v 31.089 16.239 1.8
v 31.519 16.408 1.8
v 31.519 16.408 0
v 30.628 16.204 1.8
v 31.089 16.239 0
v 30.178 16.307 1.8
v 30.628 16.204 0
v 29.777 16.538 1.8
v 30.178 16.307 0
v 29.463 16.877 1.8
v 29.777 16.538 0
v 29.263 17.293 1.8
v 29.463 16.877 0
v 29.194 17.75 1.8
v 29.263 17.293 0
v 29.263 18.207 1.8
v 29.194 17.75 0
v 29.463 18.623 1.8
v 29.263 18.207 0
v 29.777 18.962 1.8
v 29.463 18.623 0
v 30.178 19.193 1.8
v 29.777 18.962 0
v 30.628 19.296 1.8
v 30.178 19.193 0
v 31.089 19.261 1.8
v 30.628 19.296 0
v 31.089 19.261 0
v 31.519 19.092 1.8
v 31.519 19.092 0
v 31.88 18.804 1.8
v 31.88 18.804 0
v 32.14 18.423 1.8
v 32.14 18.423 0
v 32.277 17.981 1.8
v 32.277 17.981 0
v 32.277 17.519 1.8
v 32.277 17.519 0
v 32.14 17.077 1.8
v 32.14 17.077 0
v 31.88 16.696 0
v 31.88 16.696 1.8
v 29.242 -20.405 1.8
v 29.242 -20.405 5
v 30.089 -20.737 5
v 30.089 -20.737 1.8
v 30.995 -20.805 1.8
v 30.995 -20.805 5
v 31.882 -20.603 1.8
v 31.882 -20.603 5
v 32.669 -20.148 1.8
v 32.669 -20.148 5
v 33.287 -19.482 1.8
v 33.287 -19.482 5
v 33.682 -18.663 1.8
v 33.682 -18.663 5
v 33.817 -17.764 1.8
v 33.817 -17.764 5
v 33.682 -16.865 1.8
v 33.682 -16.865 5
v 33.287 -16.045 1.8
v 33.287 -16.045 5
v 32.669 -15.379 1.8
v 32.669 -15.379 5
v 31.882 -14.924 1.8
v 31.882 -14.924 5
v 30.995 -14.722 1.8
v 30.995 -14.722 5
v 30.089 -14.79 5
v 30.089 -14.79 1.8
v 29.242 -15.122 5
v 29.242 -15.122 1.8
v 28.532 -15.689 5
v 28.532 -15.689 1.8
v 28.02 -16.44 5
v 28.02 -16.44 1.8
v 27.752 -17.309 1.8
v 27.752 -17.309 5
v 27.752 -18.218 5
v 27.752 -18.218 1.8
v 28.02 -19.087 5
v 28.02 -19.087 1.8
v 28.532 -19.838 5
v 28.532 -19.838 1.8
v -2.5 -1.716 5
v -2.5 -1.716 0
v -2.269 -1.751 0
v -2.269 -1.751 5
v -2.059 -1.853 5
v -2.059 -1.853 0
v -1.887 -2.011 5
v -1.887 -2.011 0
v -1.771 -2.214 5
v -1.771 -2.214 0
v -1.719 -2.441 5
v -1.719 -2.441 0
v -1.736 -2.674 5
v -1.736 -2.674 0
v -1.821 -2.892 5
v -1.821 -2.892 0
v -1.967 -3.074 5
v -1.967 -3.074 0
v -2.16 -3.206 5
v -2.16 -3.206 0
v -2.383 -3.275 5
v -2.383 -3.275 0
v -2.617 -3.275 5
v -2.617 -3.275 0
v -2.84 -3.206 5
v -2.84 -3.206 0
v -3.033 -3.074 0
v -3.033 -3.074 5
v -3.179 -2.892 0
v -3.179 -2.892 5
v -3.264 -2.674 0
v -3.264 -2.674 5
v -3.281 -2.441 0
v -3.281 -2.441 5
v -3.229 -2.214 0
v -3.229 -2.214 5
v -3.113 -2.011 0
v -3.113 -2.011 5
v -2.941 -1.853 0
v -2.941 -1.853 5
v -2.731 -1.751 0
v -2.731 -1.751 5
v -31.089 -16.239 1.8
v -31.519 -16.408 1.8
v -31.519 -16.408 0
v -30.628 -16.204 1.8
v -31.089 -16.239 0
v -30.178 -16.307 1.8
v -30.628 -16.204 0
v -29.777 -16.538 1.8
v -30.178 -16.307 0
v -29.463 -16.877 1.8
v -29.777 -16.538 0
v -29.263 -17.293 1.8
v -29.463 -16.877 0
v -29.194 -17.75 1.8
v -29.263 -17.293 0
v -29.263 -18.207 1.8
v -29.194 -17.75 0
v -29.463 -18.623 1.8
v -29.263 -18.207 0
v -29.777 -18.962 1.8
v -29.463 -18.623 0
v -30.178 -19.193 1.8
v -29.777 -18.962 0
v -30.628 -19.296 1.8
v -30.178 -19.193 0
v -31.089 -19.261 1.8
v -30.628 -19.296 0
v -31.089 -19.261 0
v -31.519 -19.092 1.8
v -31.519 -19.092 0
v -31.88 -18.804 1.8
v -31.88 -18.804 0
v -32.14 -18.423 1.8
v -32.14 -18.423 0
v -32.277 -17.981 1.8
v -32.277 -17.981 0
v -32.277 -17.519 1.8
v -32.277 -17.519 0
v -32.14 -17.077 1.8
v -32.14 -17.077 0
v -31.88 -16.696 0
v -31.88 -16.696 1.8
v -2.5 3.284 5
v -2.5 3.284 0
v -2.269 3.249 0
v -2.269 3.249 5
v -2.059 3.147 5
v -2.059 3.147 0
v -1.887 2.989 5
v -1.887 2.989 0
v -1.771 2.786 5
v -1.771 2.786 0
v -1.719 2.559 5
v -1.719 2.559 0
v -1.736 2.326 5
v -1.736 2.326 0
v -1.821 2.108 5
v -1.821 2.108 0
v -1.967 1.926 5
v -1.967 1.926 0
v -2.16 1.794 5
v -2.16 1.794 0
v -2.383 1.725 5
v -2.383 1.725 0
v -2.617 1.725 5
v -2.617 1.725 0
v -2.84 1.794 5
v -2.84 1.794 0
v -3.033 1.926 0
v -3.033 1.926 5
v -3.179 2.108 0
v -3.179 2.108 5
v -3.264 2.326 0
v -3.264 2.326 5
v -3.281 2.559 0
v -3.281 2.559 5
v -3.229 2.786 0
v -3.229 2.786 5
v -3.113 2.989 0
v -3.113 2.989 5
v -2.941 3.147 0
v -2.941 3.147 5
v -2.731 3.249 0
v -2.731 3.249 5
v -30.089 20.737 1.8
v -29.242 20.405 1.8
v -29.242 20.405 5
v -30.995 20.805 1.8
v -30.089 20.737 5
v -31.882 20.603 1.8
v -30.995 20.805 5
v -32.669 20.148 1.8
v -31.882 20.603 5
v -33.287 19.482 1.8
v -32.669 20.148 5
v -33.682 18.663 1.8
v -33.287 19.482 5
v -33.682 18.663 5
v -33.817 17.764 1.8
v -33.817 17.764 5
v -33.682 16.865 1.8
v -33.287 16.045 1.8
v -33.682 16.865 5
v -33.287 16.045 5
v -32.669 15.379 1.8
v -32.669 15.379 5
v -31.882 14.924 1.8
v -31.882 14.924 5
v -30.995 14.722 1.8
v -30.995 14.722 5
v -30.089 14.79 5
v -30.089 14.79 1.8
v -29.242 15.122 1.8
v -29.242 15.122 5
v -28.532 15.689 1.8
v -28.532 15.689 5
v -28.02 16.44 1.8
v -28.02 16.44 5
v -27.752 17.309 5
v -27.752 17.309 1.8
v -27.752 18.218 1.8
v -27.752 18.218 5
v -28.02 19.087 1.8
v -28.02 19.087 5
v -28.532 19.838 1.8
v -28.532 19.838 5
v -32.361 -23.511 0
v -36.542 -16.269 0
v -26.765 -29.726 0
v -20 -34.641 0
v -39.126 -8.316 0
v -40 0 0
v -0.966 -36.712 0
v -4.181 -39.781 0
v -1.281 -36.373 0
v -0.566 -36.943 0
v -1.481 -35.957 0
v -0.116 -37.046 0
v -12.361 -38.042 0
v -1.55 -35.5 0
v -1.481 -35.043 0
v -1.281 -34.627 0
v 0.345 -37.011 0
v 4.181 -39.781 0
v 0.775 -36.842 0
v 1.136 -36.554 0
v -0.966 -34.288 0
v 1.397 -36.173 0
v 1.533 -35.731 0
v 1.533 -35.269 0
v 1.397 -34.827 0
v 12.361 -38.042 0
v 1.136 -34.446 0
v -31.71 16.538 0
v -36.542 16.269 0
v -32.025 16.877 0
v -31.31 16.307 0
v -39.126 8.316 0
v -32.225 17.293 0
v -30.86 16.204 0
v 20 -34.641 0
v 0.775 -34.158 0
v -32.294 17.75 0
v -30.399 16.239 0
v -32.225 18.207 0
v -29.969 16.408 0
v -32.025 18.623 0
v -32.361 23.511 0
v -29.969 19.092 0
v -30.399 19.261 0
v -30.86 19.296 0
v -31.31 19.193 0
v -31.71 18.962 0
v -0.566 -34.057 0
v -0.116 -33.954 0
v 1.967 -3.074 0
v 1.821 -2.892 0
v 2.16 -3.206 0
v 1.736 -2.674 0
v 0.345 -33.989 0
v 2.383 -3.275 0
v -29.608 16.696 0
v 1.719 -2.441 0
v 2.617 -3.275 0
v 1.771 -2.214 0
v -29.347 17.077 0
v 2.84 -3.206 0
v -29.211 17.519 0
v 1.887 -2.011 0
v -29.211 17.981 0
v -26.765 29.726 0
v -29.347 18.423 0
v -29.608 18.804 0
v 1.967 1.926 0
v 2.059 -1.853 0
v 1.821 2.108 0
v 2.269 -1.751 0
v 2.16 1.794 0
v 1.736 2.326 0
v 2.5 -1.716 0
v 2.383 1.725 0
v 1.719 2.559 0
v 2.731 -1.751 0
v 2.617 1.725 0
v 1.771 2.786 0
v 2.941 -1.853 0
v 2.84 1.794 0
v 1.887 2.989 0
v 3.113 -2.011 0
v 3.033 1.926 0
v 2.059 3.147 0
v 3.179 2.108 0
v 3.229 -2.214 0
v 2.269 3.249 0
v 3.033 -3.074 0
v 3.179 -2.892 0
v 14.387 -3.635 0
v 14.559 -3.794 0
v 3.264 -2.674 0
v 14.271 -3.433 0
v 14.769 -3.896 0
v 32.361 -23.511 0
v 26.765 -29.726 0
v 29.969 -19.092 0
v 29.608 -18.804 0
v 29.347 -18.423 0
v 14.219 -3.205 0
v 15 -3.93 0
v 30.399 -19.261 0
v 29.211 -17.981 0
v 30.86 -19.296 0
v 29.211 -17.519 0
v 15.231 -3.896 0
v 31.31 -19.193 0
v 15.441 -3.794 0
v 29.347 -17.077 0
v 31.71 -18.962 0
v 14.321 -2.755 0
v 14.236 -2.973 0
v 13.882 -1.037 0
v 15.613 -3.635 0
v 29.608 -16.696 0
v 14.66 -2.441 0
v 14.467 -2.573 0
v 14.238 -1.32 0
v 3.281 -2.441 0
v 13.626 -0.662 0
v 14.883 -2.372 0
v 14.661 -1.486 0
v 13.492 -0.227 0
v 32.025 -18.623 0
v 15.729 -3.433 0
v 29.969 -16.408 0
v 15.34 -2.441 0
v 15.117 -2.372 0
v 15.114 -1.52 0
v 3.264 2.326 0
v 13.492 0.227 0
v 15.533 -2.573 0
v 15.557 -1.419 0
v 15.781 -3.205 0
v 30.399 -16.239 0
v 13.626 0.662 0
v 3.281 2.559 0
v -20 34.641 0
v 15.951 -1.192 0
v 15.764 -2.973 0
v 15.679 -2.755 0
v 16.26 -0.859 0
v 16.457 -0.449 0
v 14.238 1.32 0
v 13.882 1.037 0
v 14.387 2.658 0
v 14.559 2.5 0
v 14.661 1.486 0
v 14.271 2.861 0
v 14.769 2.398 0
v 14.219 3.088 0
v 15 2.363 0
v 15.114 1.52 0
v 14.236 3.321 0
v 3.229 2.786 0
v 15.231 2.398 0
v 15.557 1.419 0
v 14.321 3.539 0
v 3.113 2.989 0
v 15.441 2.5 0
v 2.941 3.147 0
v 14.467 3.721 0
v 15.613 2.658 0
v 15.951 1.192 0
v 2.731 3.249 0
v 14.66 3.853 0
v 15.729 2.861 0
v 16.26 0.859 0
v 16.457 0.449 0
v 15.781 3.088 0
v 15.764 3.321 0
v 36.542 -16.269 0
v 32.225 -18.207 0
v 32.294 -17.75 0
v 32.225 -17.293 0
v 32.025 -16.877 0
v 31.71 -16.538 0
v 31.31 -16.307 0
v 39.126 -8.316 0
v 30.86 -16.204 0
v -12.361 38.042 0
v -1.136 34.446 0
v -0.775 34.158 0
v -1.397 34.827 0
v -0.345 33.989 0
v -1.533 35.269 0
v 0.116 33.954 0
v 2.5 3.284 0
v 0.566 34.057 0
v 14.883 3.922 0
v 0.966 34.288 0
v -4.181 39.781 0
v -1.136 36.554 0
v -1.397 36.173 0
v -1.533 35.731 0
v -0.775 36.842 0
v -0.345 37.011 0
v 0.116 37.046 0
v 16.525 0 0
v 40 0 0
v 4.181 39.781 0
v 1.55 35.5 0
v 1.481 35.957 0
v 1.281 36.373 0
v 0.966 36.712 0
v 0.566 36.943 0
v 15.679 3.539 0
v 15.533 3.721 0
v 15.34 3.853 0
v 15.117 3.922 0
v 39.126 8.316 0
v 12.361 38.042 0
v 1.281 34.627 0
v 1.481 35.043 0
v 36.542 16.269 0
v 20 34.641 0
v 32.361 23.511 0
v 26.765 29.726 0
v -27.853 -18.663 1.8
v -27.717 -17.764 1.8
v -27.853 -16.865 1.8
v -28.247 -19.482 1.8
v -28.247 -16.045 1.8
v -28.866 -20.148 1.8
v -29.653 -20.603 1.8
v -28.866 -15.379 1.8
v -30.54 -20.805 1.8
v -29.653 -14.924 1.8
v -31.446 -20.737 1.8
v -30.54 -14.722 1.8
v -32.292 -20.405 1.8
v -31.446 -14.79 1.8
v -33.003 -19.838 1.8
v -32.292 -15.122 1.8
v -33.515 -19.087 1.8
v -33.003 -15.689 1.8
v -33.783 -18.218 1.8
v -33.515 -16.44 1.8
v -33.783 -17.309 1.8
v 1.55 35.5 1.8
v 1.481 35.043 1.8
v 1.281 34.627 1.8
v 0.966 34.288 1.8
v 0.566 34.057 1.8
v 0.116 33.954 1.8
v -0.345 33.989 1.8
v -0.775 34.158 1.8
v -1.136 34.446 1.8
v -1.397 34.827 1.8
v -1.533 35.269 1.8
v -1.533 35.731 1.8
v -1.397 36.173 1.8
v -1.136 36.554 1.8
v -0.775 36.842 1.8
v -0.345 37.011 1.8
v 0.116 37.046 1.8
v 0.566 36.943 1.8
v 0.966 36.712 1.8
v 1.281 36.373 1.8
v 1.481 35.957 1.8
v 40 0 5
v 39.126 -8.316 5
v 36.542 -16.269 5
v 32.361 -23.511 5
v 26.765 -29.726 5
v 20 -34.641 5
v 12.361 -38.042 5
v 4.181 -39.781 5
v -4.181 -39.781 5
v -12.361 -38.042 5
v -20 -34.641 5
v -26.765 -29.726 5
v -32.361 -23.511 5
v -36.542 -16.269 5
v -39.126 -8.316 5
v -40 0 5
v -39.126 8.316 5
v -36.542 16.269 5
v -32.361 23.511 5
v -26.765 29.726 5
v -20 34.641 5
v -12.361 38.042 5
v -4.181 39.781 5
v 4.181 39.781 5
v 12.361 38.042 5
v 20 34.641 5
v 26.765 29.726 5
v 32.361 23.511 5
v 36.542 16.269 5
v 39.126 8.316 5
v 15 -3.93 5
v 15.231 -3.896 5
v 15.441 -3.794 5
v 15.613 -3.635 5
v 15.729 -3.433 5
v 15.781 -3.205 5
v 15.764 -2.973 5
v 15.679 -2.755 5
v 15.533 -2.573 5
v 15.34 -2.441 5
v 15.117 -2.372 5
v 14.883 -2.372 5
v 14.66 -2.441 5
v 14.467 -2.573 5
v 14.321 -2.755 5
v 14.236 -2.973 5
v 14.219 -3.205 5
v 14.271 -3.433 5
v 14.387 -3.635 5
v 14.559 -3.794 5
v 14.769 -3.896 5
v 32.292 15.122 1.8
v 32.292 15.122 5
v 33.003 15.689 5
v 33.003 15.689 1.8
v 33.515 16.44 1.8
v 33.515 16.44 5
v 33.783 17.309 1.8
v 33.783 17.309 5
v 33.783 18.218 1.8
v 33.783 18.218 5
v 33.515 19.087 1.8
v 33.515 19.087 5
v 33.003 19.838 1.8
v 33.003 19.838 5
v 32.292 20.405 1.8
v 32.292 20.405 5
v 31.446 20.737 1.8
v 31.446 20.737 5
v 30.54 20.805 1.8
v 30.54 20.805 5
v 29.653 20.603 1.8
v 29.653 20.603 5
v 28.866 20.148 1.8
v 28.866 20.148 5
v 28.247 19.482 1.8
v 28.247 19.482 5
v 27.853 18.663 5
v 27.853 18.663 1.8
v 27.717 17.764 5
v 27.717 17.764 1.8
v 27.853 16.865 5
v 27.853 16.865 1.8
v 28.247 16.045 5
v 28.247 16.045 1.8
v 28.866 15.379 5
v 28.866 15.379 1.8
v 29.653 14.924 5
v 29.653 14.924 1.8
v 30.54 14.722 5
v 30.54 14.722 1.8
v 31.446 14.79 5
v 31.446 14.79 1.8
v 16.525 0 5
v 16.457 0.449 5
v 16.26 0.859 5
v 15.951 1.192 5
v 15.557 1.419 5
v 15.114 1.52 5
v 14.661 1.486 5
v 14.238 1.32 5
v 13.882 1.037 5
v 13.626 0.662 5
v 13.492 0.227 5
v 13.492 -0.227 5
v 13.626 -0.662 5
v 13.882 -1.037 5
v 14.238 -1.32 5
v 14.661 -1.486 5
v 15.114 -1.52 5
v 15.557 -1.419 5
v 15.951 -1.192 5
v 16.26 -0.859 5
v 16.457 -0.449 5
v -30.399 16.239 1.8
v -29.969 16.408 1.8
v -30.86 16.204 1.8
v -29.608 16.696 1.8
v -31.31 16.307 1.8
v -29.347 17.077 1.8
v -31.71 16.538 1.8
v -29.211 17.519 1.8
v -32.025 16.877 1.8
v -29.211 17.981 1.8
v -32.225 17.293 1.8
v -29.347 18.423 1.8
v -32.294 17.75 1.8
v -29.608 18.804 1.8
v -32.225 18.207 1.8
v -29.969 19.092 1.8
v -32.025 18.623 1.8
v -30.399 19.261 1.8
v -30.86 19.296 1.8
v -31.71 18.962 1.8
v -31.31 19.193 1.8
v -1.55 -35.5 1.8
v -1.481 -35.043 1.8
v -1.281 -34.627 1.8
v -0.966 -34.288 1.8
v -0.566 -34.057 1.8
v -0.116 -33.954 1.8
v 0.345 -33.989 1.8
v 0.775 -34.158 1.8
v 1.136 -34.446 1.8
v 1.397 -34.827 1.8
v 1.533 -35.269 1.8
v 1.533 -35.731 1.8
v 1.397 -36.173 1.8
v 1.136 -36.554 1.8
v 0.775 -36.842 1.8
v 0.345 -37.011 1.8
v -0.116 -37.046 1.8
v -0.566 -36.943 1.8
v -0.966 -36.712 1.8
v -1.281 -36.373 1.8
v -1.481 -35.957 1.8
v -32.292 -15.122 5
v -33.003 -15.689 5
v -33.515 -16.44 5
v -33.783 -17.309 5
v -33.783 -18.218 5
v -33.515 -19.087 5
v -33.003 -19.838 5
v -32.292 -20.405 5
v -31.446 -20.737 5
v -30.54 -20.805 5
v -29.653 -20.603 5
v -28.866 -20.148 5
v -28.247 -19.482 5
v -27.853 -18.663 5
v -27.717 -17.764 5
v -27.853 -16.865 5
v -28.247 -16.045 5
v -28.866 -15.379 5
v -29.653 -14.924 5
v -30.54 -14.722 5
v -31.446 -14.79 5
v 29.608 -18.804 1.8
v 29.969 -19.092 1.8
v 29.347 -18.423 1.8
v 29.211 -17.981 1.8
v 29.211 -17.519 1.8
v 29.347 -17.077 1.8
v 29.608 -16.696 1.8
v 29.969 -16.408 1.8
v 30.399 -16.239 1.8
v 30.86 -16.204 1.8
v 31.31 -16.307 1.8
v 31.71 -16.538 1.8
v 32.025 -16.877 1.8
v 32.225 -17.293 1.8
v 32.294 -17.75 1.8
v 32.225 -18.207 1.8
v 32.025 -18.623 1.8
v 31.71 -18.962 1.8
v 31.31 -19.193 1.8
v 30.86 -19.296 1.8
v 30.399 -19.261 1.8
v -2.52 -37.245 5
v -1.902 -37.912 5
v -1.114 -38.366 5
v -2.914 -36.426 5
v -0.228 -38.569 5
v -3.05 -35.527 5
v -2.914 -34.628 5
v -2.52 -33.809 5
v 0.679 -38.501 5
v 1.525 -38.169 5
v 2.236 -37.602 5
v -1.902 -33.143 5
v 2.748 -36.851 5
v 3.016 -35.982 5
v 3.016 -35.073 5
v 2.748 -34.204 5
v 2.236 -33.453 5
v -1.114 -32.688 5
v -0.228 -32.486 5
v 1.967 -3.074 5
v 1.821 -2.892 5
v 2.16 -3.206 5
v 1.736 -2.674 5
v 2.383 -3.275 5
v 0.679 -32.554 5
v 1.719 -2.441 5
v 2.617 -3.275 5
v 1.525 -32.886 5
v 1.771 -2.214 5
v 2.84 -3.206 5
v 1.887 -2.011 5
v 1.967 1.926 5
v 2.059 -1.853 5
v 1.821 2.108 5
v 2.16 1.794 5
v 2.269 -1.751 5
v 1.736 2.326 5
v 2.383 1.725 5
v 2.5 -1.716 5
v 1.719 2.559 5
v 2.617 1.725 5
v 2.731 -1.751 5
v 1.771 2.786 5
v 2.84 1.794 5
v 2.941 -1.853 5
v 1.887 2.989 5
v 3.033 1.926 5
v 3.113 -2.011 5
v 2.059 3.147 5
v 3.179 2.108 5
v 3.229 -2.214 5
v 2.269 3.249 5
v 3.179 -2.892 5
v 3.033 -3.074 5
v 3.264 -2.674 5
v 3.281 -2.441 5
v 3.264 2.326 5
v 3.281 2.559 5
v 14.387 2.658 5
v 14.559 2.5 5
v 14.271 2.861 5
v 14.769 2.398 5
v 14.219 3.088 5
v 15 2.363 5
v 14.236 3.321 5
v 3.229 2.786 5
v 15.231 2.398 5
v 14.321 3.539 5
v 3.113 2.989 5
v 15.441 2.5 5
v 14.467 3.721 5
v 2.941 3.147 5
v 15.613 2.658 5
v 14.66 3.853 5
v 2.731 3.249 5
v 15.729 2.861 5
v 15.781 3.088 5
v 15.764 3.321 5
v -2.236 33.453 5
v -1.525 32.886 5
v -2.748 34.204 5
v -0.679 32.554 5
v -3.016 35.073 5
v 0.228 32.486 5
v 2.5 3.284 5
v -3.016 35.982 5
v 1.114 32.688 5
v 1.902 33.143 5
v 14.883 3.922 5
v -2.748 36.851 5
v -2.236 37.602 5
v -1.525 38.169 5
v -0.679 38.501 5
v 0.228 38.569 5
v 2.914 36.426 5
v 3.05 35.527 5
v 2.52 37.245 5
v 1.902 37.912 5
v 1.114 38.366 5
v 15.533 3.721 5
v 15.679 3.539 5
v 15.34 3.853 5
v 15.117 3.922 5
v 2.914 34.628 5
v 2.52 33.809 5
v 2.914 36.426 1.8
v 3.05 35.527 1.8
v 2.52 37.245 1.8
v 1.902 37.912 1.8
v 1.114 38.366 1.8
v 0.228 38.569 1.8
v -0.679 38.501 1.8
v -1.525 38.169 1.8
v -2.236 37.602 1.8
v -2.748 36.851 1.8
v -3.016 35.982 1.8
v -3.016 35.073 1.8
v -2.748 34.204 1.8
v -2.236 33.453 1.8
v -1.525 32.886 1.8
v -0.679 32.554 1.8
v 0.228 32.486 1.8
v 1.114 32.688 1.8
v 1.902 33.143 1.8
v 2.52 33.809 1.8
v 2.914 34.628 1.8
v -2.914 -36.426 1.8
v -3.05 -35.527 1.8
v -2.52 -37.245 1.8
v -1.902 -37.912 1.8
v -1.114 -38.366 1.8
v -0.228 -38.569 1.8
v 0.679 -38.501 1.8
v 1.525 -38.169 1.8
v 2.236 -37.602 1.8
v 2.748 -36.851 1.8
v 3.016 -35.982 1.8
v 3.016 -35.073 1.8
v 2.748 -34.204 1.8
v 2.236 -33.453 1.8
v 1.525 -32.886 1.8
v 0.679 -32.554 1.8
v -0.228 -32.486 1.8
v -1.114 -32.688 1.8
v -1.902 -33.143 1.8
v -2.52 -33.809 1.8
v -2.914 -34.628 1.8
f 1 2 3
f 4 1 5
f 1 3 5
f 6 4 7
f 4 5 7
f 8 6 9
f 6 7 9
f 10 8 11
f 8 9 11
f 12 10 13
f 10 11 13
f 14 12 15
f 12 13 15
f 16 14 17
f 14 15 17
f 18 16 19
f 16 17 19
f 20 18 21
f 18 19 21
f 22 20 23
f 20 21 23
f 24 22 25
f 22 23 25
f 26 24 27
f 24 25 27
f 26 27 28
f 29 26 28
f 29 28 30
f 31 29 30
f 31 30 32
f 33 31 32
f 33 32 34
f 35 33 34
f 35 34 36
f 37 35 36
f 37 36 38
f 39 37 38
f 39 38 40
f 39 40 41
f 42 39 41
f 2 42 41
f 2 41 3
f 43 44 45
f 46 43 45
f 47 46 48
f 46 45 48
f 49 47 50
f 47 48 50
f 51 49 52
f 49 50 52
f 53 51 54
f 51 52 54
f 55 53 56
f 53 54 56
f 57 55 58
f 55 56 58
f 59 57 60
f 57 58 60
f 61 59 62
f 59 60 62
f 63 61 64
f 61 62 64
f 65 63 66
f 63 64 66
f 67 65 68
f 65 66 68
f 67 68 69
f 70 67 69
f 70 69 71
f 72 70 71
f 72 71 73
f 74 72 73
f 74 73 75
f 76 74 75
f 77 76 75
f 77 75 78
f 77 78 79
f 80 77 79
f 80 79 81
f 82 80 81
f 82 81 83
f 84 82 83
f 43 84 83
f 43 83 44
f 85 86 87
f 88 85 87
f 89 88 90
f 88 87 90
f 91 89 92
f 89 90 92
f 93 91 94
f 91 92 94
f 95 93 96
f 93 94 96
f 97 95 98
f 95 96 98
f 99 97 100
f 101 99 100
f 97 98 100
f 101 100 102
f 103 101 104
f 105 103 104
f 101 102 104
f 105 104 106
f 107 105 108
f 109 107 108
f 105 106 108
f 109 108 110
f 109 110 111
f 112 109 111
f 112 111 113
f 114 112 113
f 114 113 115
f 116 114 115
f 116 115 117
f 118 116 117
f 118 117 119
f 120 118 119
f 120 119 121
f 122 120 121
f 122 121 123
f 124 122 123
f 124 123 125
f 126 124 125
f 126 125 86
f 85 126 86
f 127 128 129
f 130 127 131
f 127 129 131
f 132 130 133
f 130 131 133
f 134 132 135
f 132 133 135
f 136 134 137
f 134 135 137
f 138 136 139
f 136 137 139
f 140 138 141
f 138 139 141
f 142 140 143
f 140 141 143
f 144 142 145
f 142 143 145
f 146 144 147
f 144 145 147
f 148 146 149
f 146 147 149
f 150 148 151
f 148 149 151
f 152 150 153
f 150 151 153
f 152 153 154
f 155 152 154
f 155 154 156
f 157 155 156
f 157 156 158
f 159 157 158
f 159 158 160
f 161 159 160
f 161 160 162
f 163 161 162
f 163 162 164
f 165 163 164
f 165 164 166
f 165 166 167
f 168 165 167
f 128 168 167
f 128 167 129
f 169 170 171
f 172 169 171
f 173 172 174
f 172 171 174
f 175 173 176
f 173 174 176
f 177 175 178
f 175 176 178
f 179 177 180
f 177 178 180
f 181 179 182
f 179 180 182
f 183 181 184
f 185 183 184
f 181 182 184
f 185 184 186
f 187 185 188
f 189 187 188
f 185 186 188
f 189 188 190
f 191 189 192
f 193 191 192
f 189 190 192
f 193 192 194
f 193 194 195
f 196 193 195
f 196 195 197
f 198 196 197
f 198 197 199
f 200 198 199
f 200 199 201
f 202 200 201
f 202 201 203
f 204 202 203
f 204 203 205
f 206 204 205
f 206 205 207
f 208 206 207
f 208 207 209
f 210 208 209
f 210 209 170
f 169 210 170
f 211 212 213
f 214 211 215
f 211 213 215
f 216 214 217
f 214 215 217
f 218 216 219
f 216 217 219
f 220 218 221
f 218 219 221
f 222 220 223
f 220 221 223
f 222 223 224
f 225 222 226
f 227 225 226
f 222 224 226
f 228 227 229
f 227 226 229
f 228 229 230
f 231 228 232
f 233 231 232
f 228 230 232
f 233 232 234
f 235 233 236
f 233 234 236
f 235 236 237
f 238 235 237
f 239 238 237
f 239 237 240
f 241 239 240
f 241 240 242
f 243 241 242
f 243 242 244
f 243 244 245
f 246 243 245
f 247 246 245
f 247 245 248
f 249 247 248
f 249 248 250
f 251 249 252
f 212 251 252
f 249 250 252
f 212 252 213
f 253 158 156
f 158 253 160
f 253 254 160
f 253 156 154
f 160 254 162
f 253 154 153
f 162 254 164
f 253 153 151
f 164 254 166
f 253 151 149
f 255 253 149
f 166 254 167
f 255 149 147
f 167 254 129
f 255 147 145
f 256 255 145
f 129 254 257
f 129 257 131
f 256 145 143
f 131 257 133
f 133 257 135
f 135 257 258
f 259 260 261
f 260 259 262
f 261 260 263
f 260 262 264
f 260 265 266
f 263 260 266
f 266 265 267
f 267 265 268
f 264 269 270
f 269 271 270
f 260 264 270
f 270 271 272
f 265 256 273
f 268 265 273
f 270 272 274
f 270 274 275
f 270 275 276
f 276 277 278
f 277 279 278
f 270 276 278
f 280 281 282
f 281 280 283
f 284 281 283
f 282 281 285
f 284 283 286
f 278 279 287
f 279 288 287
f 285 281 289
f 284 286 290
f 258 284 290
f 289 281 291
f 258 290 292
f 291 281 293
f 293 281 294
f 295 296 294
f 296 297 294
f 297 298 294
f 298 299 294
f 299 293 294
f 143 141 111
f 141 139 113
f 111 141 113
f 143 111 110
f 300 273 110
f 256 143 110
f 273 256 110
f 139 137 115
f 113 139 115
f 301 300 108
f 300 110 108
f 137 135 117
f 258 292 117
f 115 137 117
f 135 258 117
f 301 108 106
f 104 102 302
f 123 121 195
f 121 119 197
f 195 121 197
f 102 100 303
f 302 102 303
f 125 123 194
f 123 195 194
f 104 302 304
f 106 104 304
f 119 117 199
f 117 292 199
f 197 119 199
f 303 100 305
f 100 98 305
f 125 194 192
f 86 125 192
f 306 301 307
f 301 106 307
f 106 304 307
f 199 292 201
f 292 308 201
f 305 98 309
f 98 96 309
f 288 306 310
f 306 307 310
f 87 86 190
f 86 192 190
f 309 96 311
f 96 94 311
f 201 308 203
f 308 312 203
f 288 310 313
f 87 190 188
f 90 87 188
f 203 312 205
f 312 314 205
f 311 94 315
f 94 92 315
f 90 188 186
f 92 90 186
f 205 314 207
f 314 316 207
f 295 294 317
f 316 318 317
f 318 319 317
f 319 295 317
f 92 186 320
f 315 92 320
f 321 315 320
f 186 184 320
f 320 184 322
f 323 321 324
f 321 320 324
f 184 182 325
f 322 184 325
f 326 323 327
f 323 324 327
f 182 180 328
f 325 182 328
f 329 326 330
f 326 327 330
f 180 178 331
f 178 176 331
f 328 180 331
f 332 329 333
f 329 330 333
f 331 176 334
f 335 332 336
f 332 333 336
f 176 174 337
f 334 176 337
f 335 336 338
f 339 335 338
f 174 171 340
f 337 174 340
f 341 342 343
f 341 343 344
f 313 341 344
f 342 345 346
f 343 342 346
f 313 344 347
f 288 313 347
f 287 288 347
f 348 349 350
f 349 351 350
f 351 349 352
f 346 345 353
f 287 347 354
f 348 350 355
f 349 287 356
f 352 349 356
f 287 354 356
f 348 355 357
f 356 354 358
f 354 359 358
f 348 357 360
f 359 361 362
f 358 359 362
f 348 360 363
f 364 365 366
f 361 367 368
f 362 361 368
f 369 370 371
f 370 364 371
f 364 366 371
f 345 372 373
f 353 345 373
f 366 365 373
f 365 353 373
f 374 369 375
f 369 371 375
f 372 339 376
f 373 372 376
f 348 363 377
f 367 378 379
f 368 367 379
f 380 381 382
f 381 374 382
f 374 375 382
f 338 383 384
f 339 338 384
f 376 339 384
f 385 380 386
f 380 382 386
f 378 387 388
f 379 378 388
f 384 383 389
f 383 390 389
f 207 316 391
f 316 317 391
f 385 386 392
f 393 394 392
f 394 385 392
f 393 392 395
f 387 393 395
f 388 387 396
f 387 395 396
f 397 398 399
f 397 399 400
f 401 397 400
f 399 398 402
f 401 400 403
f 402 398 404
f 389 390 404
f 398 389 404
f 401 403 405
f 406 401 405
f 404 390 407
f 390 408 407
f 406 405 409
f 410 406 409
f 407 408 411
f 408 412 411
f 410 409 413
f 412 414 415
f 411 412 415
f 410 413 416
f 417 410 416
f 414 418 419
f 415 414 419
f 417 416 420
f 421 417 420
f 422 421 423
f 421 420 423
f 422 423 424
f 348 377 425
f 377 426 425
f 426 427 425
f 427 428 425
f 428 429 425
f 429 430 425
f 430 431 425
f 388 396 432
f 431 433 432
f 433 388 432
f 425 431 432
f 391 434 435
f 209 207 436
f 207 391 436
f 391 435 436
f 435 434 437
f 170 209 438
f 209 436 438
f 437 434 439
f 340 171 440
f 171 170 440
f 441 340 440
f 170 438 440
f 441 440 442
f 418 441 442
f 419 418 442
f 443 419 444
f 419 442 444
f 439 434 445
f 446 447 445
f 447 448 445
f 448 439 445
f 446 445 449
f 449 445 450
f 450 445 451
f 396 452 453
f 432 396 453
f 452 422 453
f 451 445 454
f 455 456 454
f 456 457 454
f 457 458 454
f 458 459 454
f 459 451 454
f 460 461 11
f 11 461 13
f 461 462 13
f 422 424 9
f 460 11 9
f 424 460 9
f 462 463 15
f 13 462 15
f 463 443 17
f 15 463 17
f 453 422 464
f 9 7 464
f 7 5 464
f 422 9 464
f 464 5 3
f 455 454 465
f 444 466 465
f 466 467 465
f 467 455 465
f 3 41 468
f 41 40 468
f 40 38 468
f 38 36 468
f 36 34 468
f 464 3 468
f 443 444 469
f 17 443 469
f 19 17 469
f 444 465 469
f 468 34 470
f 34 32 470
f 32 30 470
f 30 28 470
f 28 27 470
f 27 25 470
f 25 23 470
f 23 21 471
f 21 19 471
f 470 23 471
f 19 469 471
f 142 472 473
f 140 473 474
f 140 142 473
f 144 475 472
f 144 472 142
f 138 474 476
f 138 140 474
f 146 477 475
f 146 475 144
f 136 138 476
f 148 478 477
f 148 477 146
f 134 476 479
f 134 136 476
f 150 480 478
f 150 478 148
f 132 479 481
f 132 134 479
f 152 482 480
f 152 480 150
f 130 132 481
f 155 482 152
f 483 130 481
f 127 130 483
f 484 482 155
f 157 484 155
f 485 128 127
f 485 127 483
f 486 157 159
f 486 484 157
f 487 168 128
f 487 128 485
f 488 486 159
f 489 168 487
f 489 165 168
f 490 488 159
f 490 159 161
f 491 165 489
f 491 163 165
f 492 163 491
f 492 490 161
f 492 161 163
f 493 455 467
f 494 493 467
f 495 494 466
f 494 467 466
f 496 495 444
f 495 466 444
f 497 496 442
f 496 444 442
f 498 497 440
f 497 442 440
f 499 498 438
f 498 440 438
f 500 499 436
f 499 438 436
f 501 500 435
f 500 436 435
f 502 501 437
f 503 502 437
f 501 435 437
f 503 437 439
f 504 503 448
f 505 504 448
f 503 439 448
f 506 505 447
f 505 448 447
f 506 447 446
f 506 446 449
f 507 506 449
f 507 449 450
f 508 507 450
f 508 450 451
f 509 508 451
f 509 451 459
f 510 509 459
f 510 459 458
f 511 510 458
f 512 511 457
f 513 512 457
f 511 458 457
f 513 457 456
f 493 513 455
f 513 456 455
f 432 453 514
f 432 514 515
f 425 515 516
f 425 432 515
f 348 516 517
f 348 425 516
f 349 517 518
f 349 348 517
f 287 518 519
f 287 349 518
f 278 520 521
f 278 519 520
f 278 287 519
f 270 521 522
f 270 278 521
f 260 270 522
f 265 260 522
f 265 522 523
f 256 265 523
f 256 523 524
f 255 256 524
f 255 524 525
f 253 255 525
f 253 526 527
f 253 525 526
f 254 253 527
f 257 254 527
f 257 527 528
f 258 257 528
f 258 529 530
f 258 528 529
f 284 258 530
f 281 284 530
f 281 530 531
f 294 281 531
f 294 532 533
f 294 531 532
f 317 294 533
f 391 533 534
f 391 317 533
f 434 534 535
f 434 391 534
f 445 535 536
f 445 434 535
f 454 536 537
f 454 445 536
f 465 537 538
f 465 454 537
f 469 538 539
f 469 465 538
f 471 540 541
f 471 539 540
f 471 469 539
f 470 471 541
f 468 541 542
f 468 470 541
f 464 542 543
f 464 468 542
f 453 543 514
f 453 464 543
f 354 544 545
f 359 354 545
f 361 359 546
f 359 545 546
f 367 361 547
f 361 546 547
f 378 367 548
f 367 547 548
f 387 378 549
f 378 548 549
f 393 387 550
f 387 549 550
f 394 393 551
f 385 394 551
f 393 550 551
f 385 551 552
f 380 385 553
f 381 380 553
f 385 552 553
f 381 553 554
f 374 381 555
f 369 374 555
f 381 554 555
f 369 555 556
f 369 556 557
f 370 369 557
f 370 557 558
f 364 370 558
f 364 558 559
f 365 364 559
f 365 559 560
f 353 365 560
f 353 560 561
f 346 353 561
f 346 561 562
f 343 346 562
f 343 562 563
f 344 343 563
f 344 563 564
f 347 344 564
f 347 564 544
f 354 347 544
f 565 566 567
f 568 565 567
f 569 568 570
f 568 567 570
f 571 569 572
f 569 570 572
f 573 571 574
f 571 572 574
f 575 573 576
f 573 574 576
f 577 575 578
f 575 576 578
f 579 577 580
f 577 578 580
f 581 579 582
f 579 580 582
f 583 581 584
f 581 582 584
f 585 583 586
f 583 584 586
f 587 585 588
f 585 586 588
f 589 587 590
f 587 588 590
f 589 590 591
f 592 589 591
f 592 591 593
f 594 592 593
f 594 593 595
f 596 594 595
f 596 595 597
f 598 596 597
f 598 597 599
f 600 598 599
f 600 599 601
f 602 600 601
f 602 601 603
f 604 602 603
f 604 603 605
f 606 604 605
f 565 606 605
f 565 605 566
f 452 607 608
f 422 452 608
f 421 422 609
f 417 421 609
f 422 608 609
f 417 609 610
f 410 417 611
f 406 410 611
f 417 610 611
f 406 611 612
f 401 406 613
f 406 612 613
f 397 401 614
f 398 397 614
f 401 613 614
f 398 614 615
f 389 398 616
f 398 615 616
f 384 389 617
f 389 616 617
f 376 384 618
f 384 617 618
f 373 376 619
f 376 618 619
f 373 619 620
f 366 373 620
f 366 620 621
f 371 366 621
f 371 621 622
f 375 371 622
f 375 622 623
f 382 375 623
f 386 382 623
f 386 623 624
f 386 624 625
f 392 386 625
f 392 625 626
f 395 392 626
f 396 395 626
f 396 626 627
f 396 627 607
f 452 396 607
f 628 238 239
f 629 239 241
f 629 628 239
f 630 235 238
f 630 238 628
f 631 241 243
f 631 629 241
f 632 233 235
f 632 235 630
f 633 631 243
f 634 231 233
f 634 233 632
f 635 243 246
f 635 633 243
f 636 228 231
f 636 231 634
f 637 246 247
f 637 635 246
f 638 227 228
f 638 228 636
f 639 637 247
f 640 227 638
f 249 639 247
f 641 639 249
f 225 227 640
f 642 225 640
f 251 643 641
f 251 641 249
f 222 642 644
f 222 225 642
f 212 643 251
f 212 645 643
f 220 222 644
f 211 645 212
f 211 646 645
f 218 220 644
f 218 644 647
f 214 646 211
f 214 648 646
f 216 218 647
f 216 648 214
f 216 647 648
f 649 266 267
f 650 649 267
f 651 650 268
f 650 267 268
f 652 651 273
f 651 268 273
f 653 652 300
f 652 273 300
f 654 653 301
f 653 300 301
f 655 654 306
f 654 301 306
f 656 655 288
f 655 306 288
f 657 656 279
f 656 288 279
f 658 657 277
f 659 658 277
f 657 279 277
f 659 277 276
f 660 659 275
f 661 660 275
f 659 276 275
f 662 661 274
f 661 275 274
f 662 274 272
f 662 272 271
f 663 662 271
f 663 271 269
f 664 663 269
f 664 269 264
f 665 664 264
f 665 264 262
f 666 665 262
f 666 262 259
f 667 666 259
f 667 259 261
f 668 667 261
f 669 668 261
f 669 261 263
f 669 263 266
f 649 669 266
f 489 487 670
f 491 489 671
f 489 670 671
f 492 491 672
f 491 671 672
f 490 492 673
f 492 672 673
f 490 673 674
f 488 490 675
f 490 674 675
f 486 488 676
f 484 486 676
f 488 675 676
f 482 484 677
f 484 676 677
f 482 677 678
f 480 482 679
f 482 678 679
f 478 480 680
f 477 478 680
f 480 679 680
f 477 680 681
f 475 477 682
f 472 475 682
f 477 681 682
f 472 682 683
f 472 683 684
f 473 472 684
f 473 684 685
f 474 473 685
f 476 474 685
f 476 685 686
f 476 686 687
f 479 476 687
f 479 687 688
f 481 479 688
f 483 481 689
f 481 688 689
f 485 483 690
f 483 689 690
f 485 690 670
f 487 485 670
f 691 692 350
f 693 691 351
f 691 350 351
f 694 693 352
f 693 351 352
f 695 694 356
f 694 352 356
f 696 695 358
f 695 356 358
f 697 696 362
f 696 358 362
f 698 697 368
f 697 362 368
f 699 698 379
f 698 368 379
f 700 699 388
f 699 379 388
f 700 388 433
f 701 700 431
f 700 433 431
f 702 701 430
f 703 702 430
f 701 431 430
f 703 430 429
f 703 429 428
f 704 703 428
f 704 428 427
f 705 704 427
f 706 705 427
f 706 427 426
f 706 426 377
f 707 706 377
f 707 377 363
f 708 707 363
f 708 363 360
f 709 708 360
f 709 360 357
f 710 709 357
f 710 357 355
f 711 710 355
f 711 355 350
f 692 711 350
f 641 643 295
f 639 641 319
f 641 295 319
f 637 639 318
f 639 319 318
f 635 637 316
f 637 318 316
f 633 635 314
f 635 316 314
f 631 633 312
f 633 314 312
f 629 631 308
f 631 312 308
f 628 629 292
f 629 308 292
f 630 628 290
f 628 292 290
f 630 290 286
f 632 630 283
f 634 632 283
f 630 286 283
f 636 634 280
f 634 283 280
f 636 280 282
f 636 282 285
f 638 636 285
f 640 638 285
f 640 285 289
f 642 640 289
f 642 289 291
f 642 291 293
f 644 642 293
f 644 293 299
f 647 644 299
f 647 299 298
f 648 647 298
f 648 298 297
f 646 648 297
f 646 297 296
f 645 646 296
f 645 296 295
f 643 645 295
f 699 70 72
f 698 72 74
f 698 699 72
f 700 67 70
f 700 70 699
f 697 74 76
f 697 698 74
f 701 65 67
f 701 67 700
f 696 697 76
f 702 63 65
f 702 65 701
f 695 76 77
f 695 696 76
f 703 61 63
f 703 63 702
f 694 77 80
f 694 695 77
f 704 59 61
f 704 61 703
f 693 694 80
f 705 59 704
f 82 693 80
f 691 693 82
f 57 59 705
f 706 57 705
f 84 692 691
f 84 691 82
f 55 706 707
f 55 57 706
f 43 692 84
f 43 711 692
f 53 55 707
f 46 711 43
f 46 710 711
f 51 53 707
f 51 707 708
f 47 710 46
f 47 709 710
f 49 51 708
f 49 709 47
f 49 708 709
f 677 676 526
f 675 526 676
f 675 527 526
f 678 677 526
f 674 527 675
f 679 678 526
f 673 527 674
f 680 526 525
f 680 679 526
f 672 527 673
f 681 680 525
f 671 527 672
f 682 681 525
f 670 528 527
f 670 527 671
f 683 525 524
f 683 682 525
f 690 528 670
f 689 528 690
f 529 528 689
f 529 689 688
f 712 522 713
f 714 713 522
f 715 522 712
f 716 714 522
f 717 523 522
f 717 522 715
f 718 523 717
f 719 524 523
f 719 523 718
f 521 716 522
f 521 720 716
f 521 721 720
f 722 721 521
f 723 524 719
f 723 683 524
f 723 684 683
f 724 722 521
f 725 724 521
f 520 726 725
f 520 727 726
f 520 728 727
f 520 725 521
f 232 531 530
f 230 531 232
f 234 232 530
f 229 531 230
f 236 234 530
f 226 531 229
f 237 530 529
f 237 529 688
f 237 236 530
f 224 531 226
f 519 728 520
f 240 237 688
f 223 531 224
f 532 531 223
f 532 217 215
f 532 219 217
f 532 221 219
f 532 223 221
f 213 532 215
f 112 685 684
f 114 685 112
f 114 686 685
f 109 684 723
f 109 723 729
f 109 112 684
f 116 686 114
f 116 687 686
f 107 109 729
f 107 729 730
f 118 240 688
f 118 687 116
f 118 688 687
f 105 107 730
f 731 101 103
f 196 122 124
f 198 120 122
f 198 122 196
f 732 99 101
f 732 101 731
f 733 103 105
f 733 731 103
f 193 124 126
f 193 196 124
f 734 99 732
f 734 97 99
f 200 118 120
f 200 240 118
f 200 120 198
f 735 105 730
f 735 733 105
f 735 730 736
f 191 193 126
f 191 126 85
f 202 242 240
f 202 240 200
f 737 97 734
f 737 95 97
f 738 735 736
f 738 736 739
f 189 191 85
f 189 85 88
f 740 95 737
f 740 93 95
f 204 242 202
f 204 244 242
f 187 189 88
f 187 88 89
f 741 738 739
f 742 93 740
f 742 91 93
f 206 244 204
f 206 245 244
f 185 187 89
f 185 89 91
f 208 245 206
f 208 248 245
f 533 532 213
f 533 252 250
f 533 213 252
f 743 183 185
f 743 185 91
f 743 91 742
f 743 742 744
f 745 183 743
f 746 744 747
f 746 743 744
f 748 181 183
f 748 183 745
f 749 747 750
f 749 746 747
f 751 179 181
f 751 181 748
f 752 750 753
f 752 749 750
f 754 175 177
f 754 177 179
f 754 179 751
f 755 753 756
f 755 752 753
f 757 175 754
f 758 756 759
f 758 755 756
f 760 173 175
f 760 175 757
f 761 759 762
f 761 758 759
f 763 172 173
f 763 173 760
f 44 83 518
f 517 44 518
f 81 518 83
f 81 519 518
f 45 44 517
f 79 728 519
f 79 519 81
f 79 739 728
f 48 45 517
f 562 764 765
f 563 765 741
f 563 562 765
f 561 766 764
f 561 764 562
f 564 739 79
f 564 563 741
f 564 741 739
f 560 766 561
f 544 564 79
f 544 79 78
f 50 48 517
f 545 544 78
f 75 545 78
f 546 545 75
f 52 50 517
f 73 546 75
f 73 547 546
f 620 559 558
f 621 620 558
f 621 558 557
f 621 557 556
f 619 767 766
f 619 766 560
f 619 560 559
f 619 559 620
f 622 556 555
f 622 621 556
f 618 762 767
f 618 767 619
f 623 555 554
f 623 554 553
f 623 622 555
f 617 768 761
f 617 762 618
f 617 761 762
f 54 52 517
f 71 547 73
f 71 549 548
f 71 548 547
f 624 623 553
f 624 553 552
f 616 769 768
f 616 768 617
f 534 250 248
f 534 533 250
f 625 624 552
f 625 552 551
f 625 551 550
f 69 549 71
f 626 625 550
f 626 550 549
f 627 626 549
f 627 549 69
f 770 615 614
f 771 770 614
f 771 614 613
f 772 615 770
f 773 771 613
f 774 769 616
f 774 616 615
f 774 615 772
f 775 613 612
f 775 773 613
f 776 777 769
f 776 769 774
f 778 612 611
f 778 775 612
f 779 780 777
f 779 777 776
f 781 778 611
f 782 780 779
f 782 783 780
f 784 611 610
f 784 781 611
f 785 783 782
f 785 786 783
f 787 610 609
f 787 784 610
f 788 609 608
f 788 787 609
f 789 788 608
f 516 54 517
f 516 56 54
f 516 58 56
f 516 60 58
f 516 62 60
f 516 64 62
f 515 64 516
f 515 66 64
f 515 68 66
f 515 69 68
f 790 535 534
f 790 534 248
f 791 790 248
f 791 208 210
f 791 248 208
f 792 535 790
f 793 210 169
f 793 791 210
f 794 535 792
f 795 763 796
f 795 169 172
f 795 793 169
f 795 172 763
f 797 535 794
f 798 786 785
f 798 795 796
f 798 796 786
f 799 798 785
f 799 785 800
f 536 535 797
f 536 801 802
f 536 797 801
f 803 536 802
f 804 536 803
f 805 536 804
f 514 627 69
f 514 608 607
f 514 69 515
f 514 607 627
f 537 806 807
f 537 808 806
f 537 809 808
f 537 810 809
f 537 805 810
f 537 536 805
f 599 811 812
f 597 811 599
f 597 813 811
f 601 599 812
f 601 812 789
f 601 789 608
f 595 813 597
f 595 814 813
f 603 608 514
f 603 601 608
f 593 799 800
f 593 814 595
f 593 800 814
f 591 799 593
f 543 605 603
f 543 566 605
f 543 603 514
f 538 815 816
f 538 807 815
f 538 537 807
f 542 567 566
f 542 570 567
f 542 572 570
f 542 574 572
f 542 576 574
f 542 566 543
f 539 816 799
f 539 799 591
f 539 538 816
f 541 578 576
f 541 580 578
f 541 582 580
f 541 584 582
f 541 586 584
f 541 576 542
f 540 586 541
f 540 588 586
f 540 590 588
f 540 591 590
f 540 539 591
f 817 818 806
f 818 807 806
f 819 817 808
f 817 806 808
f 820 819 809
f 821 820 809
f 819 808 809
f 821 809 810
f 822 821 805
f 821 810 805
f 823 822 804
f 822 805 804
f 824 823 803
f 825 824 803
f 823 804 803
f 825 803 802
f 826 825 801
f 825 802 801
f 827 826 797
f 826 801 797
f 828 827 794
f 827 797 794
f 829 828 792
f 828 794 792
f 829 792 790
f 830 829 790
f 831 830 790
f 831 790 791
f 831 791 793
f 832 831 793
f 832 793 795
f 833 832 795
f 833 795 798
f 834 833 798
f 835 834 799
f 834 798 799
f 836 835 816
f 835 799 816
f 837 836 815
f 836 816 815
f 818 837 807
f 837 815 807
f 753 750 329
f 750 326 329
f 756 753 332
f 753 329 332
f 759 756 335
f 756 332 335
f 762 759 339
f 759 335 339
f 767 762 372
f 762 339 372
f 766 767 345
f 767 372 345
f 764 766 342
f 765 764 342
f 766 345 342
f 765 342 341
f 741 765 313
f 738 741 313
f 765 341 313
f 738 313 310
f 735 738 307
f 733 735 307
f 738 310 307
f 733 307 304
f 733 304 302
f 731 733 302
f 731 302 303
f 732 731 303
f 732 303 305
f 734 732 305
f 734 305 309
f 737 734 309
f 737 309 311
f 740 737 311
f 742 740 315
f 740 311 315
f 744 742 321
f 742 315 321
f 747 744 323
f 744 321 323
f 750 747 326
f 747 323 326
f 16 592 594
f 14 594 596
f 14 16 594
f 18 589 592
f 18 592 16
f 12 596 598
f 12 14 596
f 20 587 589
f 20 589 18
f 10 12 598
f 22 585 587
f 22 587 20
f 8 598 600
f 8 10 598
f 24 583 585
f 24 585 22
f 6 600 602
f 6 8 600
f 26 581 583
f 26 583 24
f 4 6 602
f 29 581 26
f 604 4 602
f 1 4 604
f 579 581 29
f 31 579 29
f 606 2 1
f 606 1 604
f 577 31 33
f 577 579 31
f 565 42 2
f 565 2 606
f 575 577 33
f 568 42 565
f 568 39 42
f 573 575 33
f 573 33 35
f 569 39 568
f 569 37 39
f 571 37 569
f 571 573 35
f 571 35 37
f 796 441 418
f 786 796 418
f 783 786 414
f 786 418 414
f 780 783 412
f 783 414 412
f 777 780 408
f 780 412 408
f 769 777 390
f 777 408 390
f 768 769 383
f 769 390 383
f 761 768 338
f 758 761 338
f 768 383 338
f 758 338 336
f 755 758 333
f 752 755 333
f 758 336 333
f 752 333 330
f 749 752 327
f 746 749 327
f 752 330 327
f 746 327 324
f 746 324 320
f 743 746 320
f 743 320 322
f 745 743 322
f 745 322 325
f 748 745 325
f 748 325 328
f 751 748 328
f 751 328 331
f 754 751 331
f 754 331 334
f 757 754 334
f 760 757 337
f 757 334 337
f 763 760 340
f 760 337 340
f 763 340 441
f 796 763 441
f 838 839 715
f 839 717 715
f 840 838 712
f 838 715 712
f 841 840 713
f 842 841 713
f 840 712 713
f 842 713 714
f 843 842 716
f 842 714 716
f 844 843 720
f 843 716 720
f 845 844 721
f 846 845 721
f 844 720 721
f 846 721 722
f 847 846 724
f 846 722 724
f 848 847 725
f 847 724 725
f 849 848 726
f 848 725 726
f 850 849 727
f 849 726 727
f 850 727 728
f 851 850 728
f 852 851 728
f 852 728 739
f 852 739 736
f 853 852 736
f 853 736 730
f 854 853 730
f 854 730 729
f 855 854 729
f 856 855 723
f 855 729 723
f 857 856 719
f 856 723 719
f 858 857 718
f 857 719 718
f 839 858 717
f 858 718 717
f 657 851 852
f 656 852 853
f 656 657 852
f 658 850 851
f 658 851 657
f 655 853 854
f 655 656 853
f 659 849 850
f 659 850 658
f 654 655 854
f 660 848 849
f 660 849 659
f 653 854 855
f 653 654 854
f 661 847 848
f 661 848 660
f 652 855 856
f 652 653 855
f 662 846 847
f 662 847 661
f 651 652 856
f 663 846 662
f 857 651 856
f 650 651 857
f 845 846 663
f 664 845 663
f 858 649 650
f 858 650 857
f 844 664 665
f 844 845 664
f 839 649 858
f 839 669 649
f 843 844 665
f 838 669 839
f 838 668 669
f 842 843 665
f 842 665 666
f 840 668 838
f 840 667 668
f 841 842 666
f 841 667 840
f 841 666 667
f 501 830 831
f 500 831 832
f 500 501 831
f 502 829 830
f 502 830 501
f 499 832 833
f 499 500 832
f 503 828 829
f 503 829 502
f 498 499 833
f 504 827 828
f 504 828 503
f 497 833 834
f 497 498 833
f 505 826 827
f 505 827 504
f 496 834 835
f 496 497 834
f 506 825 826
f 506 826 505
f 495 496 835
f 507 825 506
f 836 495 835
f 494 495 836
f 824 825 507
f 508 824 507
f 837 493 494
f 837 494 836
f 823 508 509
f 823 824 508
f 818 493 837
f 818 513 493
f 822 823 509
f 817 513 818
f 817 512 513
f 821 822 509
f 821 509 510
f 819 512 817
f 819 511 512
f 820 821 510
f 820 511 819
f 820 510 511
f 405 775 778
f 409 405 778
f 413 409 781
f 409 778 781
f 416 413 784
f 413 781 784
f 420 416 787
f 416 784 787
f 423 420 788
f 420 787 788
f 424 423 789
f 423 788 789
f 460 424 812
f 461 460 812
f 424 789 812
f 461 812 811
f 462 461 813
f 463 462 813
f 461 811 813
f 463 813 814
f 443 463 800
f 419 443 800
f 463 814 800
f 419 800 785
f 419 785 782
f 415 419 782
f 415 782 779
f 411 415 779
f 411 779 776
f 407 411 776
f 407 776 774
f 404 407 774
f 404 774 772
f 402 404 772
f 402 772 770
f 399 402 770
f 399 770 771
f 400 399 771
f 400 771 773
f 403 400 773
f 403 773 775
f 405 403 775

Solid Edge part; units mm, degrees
sketch "Sketch1" plane through (0, 0, 0) normal (0, 0, 1) x (1, 0, 0)
  circle A0 centre (0, 0) radius 40
extrude "Protrusion1" add sketch "Sketch1" along normal blind 5
sketch "Sketch2" plane through (0, 0, 0) normal (0, 0, 1) x (1, 0, 0)
  circle A0 centre (0, 35.5) radius 1.55
  dimension "D1" = 35.5
extrude "Cutout1" cut sketch "Sketch2" along normal up to next
sketch "Sketch3" plane through (0, 0, 5) normal (0, 0, 1) x (1, 0, 0)
  circle A0 centre (0, 35.5272) radius 3.05
extrude "ExtrudedCutout_2" cut sketch "Sketch3" against normal blind 3.2
pattern_circular "Pattern1" count 6 over 360 about axis through (0, 0, 5) along (0, 0, -1) of "ExtrudedCutout_2", "Cutout1"
sketch "Sketch4" plane through (0, 0, 5) normal (0, 0, 1) x (1, 0, 0)
  circle A0 centre (15, 0) radius 1.5247
extrude "ExtrudedCutout_3" cut sketch "Sketch4" against normal blind 43.3262
hole "Hole_1" at (15, -3.1469, 5) direction (0, 0, -1) diameter 1.567 end up to next thread major 2 thread length 2
hole "Hole1" at (15, 3.1469, 5) direction (0, 0, -1) diameter 1.567 end up to next thread major 2 thread length 2
hole "Hole_3" at (-2.5, -2.5, 0) direction (0, 0, 1) diameter 1.567 end up to next thread major 2 thread length 2
hole "Hole2" at (-2.5, 2.5, 0) direction (0, 0, 1) diameter 1.567 end up to next thread major 2 thread length 2
hole "Hole3" at (2.5, 2.5, 0) direction (0, 0, 1) diameter 1.567 end up to next thread major 2 thread length 2
hole "Hole4" at (2.5, -2.5, 0) direction (0, 0, 1) diameter 1.567 end up to next thread major 2 thread length 2
